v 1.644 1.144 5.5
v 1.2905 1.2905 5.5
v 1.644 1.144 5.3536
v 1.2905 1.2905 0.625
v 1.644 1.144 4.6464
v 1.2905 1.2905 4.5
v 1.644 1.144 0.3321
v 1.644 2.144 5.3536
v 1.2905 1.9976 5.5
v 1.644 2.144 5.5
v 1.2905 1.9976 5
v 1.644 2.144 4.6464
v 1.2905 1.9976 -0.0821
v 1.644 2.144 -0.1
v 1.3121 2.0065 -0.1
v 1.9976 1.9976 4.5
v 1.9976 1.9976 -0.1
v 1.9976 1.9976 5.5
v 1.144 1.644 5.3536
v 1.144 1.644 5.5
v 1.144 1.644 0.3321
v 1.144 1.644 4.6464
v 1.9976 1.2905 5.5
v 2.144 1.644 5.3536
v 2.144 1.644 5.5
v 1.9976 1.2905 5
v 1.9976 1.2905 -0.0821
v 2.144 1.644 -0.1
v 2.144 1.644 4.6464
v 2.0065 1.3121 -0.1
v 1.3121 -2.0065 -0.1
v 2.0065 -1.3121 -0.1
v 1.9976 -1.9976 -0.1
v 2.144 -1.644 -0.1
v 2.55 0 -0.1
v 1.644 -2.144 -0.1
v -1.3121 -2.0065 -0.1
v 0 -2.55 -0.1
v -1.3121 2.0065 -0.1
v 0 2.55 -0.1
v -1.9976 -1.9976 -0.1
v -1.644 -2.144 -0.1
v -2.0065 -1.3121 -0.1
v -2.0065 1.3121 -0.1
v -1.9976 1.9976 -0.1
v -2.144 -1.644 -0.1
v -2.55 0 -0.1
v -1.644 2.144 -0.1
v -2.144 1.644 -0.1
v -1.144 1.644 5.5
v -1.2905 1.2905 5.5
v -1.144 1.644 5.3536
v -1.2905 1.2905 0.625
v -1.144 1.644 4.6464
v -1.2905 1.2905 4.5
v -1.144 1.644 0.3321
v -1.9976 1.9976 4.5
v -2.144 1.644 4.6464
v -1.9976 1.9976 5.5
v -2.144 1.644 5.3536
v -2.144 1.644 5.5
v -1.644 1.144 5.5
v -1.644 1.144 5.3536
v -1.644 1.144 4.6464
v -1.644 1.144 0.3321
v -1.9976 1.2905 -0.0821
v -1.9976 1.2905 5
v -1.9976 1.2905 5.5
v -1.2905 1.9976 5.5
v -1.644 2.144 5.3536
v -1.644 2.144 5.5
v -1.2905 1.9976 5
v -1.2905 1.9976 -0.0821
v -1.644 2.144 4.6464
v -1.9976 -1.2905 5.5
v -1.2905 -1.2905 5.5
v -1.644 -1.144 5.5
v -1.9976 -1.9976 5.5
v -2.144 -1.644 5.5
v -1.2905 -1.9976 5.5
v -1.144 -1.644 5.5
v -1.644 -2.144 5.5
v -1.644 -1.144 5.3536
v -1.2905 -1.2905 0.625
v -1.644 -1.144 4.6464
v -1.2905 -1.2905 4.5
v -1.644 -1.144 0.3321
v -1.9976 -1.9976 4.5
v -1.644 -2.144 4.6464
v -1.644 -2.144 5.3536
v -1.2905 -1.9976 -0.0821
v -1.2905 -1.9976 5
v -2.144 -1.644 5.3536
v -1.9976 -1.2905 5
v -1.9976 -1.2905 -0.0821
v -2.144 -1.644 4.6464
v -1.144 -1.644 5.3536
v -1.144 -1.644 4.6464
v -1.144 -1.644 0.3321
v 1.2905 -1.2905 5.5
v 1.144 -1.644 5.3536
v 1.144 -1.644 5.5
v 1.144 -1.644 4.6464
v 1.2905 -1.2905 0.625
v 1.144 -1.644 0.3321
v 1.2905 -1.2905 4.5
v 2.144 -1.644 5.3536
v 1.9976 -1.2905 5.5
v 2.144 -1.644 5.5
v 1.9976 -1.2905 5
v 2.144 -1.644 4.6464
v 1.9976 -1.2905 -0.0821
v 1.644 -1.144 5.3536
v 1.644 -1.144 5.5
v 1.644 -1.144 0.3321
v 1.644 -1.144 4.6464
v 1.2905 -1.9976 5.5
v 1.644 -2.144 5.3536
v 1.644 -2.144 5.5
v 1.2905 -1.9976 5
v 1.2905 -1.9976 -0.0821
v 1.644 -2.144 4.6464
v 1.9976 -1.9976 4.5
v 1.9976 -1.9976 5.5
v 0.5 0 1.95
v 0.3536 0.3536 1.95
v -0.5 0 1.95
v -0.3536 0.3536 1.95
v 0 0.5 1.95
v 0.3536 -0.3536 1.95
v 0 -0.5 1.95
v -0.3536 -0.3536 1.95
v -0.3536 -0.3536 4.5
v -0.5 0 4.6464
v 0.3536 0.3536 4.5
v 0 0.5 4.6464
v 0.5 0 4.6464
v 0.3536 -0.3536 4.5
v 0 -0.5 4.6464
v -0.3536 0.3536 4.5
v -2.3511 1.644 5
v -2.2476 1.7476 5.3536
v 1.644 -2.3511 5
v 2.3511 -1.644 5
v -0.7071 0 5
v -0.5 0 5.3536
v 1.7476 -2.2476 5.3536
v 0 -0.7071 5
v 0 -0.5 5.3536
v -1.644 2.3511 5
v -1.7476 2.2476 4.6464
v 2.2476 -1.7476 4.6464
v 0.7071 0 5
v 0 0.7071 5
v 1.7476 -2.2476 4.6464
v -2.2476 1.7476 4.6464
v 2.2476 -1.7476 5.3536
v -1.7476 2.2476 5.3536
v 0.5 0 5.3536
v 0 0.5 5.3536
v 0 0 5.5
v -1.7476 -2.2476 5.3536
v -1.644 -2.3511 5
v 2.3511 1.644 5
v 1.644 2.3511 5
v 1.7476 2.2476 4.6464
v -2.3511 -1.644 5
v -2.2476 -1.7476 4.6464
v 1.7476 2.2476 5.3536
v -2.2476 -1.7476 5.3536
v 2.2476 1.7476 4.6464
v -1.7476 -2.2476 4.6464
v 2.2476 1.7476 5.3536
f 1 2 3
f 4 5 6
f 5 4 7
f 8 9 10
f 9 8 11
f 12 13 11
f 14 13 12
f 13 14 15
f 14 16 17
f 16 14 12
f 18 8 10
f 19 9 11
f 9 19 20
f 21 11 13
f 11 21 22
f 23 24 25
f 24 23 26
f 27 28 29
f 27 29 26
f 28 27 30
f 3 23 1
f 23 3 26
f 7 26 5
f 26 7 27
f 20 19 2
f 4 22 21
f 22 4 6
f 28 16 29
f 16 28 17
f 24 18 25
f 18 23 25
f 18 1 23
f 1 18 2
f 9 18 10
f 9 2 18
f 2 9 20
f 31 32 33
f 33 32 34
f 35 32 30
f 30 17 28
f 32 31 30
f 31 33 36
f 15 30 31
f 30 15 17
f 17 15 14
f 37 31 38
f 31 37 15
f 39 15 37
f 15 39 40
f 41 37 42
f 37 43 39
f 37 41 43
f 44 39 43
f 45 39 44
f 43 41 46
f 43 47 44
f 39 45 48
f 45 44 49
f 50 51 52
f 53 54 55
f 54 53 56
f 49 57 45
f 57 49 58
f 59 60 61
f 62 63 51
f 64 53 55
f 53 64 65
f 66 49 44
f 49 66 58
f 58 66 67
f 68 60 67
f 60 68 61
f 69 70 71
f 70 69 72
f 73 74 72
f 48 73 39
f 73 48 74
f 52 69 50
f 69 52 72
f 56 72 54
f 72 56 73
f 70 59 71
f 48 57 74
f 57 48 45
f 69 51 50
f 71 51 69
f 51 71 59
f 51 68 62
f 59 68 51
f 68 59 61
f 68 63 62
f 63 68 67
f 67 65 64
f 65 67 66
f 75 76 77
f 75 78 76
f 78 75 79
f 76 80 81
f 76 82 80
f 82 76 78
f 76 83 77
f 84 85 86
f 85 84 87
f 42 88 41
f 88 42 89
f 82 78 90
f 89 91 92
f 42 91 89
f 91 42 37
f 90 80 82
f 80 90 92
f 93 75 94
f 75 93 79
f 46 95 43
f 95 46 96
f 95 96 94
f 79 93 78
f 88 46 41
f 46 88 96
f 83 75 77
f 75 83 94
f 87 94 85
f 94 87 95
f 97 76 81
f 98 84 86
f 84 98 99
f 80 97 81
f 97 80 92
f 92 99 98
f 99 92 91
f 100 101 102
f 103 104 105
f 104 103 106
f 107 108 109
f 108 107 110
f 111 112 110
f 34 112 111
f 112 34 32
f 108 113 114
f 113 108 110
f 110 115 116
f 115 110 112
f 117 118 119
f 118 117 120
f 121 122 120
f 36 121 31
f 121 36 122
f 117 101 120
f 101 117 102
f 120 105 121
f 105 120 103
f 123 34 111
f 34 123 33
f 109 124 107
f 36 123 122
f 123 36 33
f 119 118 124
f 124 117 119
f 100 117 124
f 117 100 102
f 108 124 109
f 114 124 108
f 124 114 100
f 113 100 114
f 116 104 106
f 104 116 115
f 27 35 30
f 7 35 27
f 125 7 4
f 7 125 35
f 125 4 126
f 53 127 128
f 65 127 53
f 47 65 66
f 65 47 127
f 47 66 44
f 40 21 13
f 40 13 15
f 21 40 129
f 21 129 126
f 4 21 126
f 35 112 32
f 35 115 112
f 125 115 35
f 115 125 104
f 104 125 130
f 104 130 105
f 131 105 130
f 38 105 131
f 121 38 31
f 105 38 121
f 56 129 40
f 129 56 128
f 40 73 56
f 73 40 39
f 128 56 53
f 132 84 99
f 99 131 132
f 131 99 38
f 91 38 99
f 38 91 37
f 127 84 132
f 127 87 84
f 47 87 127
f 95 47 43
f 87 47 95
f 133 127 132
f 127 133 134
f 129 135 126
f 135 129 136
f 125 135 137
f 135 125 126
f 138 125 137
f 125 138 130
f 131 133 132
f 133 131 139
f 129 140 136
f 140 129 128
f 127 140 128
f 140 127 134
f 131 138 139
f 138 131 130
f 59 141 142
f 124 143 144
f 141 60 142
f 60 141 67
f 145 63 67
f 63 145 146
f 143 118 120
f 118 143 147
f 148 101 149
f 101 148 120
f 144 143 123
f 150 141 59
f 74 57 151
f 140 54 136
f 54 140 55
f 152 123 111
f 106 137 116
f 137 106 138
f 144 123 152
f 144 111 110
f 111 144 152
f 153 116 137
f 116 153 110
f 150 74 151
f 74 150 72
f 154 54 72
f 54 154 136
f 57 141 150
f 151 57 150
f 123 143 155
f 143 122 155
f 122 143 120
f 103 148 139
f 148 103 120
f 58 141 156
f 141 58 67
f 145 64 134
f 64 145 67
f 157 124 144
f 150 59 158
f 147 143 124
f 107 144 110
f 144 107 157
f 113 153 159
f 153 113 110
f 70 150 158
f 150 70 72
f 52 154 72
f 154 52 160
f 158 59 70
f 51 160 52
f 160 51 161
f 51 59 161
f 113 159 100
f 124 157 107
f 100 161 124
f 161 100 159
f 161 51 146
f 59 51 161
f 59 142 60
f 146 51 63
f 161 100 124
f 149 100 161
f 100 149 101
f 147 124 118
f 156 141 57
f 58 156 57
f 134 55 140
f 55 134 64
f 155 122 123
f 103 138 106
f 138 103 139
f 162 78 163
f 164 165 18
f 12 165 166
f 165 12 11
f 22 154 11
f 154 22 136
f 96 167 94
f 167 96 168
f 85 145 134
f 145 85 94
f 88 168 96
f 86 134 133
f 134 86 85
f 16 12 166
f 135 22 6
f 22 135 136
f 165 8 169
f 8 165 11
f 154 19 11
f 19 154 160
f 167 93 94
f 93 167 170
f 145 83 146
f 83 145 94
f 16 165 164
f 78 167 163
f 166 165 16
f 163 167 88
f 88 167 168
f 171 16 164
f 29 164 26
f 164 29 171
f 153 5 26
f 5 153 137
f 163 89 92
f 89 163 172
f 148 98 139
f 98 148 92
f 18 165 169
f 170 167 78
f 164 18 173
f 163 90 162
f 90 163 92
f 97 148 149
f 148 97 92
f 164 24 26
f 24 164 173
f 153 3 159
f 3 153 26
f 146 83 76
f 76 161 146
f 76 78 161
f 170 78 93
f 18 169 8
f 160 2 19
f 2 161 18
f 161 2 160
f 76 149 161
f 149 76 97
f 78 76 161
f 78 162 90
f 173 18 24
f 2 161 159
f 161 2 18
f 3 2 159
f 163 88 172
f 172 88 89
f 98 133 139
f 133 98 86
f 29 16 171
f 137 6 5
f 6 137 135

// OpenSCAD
// ClothBot Sewable Connectors

render_part=1; // CB_Sewable_Socket_Holes()
render_part=2; // CB_Sewable_Peg_Holes()

module CB_Sewable_Socket_Holes(extension=0.1
	, hole_d=4.9
	, thread_d=1.0
	, hole_h=1.8
	, thread_h=3.2
	) {
  union() {
    translate([0,0,thread_h-hole_h])
      cylinder($fs=0.1,$fa=15,r=hole_d/2,h=hole_h+extension,center=false);
    for(i=[0:3]) assign(rotAngle=360*i/4+45) {
      rotate([0,0,rotAngle]) translate([hole_d/2-0.75*thread_d/2,0,-extension])
	cylinder($fn=6,r=thread_d/2,h=2*extension+thread_h,center=false);
    }
  }
}

if(render_part==1) {
  echo("Rendering CB_Sewable_Socket_Holes()...");
  CB_Sewable_Socket_Holes();
}

module CB_Sewable_Peg_Holes(extension=0.1
	, peg_d=4.9
	, thread_d=1.0
	, peg_h=1.8
	, thread_h=3.2+1.8
	) {
  union() {
    translate([0,0,-extension]) {
      cylinder($fn=8, r1=peg_d/2+extension,r2=0,h=peg_d/2+extension,center=false);
	cylinder($fn=8,r=thread_d/2,h=extension+thread_h+thread_d/4,center=false);
      for(i=[0:3]) assign(rotAngle=360*i/4+45) {
	rotate([0,0,rotAngle]) translate([peg_d/2-0.25*thread_d/2,0,0])
	  cylinder($fn=8,r=thread_d/2,h=extension+thread_h+thread_d/2,center=false);
	}
    }
    translate([0,0,thread_h]) {
	rotate([45,90,0])
	  cylinder($fn=8,r=thread_d/2,h=peg_d+0.75*thread_d,center=true);
	rotate([-45,90,0])
	  cylinder($fn=8,r=thread_d/2,h=peg_d+0.75*thread_d,center=true);
    }
  }
}

if(render_part==2) {
  echo("Rendering CB_Sewable_Peg_Holes()...");
  CB_Sewable_Peg_Holes();
}
